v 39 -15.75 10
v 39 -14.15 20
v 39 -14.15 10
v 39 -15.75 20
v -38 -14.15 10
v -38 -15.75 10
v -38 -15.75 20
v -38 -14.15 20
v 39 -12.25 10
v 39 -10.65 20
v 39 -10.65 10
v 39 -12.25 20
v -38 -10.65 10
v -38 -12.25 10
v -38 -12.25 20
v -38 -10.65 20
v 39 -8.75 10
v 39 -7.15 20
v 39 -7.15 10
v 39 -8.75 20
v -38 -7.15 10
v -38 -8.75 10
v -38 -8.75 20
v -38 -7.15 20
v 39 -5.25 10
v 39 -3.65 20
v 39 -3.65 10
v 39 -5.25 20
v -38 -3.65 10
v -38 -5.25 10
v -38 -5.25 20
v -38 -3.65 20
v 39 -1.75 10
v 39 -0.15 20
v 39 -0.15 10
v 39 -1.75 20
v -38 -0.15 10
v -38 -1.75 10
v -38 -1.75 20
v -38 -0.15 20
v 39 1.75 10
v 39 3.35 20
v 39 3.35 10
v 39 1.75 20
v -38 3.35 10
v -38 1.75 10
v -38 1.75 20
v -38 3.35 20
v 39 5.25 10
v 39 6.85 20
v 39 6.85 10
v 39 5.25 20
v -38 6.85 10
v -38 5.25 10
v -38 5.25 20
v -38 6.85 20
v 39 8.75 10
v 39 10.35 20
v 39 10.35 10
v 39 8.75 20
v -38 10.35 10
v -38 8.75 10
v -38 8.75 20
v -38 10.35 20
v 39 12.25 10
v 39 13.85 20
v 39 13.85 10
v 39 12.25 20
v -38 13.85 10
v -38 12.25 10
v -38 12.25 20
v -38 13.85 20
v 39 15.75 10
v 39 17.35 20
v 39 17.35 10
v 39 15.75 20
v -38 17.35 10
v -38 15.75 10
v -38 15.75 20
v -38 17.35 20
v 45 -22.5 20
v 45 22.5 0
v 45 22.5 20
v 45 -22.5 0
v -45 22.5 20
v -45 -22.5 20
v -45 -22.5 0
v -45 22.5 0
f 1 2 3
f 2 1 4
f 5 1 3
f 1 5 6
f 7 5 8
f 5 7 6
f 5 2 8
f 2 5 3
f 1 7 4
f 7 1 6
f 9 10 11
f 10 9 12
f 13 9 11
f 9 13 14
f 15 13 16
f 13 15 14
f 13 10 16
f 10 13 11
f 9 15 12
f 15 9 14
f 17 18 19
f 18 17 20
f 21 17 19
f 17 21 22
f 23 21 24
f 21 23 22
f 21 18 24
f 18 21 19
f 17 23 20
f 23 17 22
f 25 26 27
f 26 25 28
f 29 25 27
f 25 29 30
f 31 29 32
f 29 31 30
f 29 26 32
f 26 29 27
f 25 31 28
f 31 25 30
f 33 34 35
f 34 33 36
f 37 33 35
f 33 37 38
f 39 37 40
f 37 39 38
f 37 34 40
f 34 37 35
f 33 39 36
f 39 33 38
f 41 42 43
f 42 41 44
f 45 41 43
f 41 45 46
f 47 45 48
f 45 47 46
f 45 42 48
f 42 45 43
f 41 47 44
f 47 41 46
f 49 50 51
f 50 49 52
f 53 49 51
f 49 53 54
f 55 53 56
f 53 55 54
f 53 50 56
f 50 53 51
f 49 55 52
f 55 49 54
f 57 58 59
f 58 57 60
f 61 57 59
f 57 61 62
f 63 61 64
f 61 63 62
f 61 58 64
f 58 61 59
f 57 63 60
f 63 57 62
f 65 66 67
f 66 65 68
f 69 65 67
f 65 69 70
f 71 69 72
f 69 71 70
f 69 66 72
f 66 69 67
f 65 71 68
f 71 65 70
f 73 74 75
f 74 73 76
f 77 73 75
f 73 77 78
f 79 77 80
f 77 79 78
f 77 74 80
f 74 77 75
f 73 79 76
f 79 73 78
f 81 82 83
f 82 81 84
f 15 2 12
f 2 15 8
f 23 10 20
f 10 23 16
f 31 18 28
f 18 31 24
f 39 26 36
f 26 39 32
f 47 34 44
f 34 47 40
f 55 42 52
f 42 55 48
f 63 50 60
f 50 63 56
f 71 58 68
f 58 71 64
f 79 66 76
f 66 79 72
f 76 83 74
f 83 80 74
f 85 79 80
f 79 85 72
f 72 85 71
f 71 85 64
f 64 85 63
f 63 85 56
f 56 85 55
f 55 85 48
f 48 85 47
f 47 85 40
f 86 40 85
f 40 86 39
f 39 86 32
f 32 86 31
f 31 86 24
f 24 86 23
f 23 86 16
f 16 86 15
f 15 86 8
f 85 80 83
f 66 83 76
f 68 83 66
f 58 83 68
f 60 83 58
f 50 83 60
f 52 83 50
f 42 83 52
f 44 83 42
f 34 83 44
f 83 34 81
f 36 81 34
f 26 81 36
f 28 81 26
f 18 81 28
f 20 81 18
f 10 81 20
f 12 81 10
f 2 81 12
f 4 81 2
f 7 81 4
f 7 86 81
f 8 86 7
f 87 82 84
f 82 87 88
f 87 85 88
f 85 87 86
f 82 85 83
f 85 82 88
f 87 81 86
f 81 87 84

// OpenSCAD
// Microscope slide drying rack
// Print orientation: base block on XY plane, slots open upward (+Z)

// ---------- Parameters ----------
slide_count     = 10;    // number of microscope slides
slide_len       = 75;    // slide length along X (mm)
slide_wid       = 25;    // slide width along Y (mm)
slide_thk       = 1;     // slide thickness along Z (mm)

base_len        = 90;    // base block length along X (mm)
base_wid        = 45;    // base block width along Y (mm)
base_hgt        = 20;    // base block height along Z (mm)

slot_len        = 77;    // slot length along X (mm)
slot_wid        = 1.6;   // slot width along Y (mm)
slot_depth      = 10;    // slot depth from top face (mm)
slot_pitch      = 3.5;   // centre-to-centre slot spacing along Y (mm)

eps             = 0.5;   // overcut past faces to avoid coplanar surfaces (mm)

$fn = 64;

// ---------- Derived ----------
slot_y0 = -(slide_count - 1) * slot_pitch / 2;   // first slot centre Y

// ---------- Model ----------
difference() {
    // Base block, centred in X and Y, sitting on z = 0
    translate([-base_len / 2, -base_wid / 2, 0])
        cube([base_len, base_wid, base_hgt]);

    // Parallel slots running along X, open at the top
    for (i = [0 : slide_count - 1]) {
        translate([-(slot_len / 2 - eps), slot_y0 + i * slot_pitch, base_hgt - slot_depth])
            cube([slot_len, slot_wid, slot_depth + eps]);
    }
}
